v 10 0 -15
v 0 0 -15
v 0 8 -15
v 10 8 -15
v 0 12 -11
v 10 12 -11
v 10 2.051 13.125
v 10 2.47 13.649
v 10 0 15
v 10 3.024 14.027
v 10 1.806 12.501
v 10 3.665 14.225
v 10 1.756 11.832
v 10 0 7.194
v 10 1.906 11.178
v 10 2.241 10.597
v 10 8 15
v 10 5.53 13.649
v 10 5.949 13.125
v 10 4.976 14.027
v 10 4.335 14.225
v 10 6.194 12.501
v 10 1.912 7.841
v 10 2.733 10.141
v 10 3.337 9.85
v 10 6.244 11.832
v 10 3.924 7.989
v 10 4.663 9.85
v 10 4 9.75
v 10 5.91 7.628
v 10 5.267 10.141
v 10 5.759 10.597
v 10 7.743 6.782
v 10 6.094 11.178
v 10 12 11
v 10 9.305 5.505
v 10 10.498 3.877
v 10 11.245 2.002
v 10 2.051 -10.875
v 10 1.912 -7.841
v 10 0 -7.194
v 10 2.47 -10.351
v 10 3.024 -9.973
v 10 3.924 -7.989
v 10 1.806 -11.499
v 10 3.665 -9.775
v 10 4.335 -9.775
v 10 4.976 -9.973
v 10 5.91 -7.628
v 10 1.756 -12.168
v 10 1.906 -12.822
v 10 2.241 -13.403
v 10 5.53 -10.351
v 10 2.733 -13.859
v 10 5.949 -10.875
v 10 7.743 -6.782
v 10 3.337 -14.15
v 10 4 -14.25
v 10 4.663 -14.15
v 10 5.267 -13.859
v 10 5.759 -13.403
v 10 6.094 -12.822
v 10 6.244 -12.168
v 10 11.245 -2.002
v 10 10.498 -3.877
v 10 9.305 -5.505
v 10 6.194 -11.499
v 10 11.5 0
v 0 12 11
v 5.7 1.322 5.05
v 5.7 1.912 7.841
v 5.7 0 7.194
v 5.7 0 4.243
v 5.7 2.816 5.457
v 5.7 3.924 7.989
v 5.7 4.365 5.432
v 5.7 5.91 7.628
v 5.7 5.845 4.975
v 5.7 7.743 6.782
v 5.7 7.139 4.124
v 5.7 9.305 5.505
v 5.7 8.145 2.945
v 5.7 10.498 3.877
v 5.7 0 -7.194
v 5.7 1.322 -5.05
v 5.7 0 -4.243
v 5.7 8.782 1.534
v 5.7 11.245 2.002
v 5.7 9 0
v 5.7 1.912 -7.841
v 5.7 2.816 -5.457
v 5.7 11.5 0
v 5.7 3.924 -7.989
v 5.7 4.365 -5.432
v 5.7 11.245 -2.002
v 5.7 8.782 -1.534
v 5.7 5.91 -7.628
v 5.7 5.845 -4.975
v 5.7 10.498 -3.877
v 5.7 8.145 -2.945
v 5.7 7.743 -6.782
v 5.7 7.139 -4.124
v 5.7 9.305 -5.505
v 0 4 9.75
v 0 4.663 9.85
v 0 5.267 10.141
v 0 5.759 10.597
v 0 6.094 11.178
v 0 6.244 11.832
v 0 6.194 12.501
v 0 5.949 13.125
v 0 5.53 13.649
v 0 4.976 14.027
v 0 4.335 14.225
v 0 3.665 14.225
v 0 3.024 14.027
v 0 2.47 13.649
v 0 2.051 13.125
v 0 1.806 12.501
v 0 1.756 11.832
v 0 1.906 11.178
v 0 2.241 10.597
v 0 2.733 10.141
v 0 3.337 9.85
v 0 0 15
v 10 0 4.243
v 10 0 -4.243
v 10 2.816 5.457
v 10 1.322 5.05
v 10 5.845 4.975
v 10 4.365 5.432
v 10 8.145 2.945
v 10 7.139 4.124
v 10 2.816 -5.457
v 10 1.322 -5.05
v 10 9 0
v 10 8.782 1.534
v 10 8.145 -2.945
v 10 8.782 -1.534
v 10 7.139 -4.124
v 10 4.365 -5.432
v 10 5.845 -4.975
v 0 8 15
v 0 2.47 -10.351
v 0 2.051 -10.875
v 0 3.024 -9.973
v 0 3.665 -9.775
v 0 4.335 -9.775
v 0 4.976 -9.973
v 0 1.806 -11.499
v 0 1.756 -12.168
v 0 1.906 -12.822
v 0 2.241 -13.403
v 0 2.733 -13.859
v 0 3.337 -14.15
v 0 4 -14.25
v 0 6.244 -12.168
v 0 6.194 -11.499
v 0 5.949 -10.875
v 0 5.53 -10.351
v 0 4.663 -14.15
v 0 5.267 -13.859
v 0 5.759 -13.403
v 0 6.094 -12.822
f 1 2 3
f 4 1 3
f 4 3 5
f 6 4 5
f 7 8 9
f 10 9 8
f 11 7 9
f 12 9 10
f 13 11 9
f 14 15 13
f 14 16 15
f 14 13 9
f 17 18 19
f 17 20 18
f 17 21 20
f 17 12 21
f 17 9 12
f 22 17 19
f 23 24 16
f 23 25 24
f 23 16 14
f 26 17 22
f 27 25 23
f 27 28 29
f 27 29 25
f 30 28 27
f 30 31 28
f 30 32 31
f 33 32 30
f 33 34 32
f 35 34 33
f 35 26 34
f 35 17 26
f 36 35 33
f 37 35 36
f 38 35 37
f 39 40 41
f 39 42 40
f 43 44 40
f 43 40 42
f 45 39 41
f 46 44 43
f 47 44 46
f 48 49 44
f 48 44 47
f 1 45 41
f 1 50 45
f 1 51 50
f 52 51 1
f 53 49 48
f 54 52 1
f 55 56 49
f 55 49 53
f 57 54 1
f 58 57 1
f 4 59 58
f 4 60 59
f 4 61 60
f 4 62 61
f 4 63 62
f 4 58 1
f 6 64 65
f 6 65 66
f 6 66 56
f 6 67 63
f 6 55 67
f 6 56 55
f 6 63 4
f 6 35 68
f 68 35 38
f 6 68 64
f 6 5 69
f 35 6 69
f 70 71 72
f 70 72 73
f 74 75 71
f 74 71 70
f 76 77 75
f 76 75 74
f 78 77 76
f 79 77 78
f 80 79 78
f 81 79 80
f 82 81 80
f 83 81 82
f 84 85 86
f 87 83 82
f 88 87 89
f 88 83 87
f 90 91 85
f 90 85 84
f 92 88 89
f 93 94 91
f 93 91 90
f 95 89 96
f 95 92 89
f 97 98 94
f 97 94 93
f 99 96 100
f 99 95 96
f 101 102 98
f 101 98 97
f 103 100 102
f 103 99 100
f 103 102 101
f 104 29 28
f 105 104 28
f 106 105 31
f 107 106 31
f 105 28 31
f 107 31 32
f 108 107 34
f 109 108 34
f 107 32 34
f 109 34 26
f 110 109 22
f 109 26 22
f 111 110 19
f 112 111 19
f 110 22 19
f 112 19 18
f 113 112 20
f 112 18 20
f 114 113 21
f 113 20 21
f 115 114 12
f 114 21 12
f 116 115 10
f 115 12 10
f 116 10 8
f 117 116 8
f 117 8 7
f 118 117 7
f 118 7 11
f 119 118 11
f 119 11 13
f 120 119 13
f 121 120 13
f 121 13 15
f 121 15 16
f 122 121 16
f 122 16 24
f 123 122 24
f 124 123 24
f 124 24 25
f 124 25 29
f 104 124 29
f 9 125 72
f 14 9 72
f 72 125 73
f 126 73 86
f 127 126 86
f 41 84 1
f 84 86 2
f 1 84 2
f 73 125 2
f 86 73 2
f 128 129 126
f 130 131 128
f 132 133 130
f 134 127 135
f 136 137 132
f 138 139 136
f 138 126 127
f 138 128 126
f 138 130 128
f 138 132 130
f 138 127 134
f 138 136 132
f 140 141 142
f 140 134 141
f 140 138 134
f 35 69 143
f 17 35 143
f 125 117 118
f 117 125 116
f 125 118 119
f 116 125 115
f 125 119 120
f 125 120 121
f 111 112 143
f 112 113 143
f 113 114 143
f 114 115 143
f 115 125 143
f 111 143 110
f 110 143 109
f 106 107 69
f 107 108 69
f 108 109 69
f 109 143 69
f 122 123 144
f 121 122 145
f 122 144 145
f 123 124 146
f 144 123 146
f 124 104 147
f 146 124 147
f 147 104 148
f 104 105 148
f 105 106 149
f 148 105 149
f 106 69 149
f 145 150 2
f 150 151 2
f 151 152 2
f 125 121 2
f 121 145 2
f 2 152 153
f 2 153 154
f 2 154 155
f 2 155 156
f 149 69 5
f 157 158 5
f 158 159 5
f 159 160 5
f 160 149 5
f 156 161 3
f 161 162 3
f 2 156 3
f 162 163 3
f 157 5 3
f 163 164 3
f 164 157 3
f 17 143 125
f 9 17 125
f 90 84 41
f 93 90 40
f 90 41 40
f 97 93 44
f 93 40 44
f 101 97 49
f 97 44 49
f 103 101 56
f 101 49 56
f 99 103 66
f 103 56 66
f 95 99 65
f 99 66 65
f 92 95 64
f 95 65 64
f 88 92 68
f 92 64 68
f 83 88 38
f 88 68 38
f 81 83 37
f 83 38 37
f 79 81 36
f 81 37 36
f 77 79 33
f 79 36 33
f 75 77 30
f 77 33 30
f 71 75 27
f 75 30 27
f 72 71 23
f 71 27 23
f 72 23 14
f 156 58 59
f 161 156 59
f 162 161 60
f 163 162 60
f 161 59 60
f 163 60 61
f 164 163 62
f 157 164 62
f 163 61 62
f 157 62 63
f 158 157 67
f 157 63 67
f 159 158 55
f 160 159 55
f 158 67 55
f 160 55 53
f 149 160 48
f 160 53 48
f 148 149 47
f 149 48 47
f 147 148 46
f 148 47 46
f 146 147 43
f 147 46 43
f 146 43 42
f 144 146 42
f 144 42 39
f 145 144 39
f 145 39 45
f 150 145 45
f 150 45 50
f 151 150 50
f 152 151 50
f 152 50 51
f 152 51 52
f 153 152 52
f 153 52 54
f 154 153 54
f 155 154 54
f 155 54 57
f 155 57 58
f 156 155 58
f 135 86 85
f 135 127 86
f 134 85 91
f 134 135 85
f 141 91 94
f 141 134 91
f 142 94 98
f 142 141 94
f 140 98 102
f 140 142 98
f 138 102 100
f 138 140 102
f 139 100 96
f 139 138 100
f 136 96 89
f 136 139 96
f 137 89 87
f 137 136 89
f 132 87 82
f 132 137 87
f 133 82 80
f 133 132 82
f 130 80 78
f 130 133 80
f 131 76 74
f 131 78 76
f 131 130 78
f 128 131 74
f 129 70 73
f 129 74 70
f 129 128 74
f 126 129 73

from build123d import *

# Parameters (mm, degrees)
BOSS_EXTRUDE1_DEPTH = 10
SKETCH2_R           = 8
SKETCH2_R_2         = 5.5
CUT_EXTRUDE2_DEPTH  = 4.3
SKETCH3_R           = 2.25
CUT_EXTRUDE3_DEPTH  = 22.656407828


with BuildPart() as part:
    # Sketch1 → Boss-Extrude1 (new body)
    with BuildSketch(Plane(origin=(0, 0, 0), x_dir=(0, 0, -1), z_dir=(1, 0, 0))):
        Polygon((-15, 0), (15, 0), (15, 8), (11, 12), (-11, 12), (-15, 8), align=None)
    extrude(amount=BOSS_EXTRUDE1_DEPTH)

    # Sketch2 → Cut-Extrude2 (cut)
    with BuildSketch(Plane(origin=(10, 0, 0), x_dir=(0, 0, -1), z_dir=(1, 0, 0))):
        with Locations((0, 3.5)):
            Circle(SKETCH2_R)
        with Locations((0, 3.5)):
            Circle(SKETCH2_R_2, mode=Mode.SUBTRACT)
    extrude(amount=-CUT_EXTRUDE2_DEPTH, mode=Mode.SUBTRACT)

    # Sketch3 → Cut-Extrude3 (cut, through all)
    with BuildSketch(Plane(origin=(10, 0, 0), x_dir=(0, 0, -1), z_dir=(1, 0, 0))):
        with Locations((-12, 4)):
            Circle(SKETCH3_R)
        with Locations((12, 4)):
            Circle(SKETCH3_R)
    extrude(amount=-CUT_EXTRUDE3_DEPTH, mode=Mode.SUBTRACT)


solid = part.part
